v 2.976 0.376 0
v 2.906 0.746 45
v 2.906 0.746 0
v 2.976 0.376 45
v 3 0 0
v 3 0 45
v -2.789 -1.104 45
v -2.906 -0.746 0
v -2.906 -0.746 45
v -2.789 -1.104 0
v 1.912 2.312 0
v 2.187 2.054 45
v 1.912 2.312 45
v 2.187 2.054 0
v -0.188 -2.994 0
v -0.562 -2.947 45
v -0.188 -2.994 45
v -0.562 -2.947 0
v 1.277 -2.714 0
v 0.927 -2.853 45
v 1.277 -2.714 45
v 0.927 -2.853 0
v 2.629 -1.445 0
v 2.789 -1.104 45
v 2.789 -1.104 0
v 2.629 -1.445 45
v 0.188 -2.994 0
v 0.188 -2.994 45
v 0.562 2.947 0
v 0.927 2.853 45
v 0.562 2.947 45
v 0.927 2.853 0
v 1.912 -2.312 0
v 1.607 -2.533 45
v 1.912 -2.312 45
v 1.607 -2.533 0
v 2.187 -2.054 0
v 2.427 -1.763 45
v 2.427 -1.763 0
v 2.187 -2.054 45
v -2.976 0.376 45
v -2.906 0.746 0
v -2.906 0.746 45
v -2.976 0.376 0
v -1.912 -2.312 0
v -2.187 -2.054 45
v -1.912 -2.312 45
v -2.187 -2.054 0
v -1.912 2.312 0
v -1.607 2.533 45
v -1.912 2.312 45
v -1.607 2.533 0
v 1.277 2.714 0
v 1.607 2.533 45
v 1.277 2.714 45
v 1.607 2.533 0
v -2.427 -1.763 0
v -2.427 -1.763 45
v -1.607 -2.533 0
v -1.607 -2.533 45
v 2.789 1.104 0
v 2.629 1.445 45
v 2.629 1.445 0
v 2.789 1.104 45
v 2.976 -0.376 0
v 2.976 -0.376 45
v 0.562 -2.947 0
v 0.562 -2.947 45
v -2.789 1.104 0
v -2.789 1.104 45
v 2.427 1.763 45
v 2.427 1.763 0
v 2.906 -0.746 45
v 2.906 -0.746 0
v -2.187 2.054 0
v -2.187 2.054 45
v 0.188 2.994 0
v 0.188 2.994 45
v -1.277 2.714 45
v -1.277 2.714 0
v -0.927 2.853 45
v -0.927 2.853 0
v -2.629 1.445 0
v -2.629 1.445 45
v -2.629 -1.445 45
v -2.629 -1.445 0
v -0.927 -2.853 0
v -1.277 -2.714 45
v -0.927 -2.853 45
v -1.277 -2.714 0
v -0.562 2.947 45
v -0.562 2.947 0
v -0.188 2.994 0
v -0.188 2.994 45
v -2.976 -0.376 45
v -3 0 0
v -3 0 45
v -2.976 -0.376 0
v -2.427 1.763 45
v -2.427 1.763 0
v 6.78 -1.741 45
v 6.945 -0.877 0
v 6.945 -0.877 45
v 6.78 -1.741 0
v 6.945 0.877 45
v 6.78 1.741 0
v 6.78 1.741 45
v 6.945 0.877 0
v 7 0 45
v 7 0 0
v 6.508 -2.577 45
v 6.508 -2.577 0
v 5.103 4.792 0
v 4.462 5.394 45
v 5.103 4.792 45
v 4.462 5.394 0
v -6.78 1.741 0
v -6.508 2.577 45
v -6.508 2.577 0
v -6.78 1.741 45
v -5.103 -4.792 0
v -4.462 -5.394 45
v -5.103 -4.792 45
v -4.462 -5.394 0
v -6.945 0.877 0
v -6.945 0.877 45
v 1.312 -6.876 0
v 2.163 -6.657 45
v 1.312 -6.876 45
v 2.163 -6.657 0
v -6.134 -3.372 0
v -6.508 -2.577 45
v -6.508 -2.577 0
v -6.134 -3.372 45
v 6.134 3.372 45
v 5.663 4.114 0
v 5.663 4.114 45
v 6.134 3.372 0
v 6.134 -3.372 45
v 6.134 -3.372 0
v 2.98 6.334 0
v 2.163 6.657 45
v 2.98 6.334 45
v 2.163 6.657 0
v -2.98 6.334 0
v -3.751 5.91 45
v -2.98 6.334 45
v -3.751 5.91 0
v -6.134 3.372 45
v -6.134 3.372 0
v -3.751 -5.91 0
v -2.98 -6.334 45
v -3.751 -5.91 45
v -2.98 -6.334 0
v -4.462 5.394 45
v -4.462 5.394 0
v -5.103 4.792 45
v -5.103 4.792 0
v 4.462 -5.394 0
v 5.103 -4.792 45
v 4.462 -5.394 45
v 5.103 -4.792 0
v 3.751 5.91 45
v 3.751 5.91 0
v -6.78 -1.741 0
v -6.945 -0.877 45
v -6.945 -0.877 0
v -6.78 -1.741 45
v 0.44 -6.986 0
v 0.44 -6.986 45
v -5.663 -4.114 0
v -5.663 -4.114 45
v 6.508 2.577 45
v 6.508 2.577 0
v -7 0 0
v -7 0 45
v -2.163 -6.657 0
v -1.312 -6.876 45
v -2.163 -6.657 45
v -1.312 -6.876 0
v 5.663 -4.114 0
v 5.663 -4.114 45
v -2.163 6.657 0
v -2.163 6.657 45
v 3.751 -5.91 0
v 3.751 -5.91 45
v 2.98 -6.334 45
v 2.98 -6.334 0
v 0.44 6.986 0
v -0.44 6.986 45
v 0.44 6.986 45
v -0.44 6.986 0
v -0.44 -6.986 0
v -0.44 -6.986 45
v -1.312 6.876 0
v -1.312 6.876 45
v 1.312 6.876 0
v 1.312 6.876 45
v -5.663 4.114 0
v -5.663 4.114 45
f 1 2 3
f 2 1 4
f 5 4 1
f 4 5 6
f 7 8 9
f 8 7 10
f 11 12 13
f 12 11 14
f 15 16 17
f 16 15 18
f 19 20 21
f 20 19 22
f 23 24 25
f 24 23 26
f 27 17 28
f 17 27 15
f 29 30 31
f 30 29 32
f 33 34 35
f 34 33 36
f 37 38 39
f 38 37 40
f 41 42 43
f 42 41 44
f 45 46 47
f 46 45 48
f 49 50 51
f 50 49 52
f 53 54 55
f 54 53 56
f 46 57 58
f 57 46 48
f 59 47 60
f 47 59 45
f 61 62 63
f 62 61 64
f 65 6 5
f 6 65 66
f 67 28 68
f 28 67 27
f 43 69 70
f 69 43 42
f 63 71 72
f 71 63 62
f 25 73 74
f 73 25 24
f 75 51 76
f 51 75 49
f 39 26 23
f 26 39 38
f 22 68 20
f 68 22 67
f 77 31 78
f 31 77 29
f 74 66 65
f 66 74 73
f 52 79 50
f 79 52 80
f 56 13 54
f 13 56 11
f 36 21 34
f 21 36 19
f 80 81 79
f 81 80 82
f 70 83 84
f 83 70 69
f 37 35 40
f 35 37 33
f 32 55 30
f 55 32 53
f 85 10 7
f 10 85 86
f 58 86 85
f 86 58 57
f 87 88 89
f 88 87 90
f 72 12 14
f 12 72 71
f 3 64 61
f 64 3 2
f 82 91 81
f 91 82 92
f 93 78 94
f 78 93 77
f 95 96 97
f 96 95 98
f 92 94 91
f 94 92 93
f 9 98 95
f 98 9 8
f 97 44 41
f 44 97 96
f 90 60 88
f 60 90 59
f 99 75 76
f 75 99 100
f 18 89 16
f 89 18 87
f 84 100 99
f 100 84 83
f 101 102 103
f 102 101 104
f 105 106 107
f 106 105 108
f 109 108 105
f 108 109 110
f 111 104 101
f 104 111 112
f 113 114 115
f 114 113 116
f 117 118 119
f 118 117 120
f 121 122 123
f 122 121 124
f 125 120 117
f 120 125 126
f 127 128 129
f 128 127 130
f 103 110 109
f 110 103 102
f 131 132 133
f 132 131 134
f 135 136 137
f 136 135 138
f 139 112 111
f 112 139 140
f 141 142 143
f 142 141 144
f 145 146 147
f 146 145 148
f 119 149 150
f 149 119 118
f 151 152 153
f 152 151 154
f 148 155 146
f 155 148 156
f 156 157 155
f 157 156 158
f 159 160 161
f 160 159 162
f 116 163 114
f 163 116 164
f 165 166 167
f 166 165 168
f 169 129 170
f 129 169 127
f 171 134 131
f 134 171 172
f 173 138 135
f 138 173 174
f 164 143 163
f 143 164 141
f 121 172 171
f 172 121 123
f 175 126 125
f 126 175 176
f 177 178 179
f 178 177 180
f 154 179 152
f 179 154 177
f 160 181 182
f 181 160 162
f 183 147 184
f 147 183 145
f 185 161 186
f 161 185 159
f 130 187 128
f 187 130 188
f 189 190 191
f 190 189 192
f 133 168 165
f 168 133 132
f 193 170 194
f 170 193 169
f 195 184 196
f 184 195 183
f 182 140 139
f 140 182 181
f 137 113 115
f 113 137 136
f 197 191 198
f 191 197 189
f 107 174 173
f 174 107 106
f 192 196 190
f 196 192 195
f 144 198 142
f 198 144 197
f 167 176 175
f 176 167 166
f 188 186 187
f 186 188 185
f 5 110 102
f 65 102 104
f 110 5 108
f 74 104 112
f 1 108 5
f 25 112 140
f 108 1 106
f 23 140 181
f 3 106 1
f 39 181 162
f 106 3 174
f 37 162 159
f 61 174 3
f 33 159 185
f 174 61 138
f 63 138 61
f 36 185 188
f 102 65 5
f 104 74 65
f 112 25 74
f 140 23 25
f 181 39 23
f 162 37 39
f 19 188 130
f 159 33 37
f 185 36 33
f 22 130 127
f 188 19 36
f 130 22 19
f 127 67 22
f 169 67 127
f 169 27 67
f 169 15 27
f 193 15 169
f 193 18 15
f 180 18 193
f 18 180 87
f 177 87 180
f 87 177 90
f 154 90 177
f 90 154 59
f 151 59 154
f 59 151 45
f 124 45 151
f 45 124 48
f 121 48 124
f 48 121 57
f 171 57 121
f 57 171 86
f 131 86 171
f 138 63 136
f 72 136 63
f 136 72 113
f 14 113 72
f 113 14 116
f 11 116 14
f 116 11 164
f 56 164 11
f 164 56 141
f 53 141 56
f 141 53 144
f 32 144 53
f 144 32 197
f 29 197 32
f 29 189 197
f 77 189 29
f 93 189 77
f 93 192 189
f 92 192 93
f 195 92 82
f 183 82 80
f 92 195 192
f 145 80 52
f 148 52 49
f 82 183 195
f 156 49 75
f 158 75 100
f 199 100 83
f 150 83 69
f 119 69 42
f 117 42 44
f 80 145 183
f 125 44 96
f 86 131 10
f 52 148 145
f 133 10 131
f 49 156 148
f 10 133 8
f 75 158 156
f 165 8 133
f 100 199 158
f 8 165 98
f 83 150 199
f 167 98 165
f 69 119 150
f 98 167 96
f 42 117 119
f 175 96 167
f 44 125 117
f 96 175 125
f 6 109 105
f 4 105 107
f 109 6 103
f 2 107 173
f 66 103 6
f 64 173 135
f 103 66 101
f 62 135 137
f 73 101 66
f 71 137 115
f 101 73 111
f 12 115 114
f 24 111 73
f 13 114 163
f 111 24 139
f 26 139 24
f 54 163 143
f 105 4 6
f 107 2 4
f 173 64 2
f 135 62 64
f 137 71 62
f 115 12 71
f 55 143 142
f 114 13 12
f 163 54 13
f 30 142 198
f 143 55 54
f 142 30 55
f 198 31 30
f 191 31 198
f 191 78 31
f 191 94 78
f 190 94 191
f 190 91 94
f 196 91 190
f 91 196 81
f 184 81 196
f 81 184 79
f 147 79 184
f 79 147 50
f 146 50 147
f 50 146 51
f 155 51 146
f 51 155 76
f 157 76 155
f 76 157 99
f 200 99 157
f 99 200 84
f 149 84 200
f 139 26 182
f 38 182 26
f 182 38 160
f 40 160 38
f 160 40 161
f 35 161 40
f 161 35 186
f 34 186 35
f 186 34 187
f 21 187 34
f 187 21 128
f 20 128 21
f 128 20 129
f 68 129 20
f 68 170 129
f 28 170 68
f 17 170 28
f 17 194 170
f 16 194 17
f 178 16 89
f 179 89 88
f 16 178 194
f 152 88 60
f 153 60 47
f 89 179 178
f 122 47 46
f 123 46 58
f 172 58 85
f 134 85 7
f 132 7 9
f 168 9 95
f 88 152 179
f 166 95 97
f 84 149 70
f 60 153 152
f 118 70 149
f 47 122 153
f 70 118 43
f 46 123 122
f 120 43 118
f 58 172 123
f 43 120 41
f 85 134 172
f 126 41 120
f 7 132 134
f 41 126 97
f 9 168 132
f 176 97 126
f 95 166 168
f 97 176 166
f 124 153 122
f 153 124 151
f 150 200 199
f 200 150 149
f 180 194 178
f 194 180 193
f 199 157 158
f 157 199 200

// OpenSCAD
$fn = 50;

difference() {
	union() {
		cylinder(h = 45, r = 7.0);
	}
	union() {
		translate(v = [0, 0, -100]) {
			cylinder(h = 200, r = 3.0);
		}
		translate(v = [0, 0, -100]) {
			cylinder(h = 200, r = 1.5);
		}
	}
}
